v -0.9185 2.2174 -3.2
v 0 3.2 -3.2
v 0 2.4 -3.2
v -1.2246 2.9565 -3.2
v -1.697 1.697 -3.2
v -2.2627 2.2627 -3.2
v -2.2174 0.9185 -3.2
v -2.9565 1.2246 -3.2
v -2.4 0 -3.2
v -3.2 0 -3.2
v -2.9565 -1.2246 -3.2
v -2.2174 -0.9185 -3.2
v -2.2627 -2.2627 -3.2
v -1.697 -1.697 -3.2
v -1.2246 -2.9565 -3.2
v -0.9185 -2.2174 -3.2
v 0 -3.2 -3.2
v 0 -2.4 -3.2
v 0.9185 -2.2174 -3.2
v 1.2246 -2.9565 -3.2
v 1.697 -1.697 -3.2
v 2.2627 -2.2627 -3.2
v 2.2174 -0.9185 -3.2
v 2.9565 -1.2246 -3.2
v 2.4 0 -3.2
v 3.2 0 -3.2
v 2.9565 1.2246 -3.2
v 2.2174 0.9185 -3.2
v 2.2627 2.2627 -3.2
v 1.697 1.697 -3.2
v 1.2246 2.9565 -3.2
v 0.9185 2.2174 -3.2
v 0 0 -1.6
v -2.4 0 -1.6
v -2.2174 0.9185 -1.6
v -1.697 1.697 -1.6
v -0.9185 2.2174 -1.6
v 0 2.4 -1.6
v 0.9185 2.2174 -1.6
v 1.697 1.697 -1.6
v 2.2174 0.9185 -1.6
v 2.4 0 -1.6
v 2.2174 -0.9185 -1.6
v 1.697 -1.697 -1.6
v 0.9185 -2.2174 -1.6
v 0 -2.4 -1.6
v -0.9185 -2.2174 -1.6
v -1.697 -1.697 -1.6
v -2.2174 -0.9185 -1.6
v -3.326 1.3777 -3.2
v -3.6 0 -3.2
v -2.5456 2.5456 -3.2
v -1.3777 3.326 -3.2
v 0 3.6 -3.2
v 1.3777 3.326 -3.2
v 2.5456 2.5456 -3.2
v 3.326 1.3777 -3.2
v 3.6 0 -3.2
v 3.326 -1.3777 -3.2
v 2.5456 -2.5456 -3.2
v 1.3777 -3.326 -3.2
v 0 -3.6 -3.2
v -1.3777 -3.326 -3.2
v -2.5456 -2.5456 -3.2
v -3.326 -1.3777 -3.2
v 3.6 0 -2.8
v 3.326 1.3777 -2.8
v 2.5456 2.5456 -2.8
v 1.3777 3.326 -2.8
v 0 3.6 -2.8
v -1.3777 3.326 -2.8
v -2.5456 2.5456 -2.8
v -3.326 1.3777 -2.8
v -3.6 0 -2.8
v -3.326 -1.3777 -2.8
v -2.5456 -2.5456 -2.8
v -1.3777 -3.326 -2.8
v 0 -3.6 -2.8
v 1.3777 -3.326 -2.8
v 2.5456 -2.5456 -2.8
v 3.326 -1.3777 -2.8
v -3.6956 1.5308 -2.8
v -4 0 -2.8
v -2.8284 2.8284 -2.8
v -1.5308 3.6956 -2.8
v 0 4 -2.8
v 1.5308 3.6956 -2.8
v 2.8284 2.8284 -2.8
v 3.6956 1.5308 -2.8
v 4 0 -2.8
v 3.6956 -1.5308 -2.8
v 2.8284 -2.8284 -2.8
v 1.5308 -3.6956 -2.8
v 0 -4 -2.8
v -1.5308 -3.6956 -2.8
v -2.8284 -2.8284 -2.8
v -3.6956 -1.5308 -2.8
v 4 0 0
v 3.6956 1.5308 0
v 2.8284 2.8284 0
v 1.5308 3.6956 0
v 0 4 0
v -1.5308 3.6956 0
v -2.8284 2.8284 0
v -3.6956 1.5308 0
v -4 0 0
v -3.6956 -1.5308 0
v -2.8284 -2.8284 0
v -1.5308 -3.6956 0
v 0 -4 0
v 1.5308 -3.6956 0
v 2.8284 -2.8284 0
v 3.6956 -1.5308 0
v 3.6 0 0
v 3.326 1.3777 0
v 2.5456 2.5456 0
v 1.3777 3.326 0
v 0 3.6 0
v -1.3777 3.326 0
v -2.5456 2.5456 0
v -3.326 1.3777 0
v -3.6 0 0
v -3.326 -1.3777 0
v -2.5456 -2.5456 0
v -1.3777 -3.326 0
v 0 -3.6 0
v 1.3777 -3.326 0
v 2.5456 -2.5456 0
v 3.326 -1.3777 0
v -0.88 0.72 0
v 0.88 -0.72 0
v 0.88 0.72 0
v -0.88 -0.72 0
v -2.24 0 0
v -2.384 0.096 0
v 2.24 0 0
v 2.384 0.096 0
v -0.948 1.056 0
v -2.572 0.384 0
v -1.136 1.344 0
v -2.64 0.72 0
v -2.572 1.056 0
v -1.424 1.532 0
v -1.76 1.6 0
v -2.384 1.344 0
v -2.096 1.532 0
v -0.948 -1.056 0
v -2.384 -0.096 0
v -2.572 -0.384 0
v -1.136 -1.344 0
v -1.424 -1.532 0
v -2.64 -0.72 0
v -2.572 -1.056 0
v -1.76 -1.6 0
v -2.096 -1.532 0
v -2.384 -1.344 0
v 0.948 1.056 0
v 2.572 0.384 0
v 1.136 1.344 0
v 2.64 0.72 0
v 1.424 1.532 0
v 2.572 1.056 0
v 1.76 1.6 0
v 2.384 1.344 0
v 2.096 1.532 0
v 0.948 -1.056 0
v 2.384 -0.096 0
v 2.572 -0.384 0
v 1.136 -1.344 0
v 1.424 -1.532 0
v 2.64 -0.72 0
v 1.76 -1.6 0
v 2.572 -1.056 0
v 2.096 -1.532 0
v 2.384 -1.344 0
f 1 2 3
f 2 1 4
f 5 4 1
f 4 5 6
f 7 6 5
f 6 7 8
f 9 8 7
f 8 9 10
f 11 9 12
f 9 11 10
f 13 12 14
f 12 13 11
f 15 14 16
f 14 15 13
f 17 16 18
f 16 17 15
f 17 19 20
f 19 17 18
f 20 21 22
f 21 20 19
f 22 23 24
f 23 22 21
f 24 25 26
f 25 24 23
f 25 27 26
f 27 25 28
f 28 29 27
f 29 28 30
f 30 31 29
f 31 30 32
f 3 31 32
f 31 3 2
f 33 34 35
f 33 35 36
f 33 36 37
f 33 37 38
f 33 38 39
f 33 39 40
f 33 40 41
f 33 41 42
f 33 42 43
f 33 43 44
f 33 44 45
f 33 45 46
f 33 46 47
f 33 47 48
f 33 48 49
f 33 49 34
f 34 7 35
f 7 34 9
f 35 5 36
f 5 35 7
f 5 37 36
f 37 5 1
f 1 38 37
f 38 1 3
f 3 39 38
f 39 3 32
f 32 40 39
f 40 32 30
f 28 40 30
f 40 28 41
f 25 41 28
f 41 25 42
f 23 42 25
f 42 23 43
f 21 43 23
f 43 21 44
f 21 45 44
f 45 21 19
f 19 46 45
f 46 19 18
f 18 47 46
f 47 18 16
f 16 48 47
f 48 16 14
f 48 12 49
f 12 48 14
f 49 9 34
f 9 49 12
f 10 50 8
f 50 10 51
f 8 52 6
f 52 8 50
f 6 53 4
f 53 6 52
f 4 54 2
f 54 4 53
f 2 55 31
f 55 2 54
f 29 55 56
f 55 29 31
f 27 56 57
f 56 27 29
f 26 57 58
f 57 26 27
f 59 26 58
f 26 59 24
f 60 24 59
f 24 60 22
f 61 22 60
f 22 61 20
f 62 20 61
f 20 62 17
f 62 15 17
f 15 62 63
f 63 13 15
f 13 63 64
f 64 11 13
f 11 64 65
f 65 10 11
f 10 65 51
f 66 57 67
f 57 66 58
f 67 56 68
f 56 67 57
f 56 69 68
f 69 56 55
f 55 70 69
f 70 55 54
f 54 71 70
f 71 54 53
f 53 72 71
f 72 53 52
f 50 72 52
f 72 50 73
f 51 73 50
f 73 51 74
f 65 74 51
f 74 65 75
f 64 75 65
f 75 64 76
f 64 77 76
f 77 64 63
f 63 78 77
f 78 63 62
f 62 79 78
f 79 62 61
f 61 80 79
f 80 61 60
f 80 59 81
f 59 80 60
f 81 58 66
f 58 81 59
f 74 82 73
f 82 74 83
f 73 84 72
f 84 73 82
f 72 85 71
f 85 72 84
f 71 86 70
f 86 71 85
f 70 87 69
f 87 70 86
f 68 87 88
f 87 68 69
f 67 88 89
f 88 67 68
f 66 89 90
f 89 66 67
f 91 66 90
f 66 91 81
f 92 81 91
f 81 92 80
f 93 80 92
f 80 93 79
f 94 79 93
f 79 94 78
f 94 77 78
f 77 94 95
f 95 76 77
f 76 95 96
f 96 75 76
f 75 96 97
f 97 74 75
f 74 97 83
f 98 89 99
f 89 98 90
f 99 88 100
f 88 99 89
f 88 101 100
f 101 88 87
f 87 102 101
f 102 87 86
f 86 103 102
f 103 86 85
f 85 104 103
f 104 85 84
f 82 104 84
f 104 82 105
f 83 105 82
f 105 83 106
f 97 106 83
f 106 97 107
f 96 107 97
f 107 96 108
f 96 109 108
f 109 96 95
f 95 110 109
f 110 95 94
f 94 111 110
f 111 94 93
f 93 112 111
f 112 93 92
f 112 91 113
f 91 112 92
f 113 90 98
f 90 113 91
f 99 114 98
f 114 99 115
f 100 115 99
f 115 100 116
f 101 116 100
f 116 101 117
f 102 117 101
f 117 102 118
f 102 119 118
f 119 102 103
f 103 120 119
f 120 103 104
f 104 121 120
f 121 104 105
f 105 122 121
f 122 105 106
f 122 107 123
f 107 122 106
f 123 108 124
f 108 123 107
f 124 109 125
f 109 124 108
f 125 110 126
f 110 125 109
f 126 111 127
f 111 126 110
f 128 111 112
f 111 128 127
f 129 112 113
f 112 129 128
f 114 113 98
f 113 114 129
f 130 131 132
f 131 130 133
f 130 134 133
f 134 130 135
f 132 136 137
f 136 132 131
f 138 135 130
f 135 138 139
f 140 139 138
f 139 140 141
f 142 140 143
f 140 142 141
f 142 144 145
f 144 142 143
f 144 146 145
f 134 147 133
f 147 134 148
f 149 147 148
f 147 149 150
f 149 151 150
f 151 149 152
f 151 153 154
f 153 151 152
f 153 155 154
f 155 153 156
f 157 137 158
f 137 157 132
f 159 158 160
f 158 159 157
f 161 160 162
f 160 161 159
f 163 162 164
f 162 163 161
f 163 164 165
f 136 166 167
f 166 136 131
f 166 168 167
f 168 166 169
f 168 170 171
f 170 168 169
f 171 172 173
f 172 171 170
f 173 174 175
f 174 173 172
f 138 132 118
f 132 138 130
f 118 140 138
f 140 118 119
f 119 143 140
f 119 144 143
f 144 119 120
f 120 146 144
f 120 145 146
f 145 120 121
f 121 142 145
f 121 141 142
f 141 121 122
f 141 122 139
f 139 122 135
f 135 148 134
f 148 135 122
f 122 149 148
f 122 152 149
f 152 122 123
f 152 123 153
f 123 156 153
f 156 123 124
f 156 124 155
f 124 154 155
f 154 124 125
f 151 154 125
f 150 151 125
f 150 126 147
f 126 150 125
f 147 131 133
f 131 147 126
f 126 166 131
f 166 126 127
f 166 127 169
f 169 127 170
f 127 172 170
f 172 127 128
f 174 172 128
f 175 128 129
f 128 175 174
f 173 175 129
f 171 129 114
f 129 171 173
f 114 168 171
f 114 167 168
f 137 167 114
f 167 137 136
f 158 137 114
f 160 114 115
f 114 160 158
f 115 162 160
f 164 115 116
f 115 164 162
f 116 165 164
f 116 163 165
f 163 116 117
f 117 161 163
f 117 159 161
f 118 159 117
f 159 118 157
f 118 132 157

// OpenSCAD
// file: ../p/4-4disc.scad
use <../lib.scad>
function ldraw_lib__4_4disc() = [
// 0 Disc 1.0
// 0 Name: 4-4disc.dat
// 0 Author: James Jessiman
// 0 !LDRAW_ORG Primitive UPDATE 2002-02
// 0 !LICENSE Licensed under CC BY 2.0 and CC BY 4.0 : see CAreadme.txt
// 
// 0 BFC CERTIFY CCW
  [0,"BFC","CERTIFY"],
  [0,"BFC","CCW"],
// 
// 0 !HISTORY 1998-12-15 [PTadmin] Official Update 1998-10
// 0 !HISTORY 2002-03-23 [sbliss] Added BFC statement
// 0 !HISTORY 2002-04-25 [PTadmin] Official Update 2002-02
// 0 !HISTORY 2007-06-24 [PTadmin] Header formatted for Contributor Agreement
// 0 !HISTORY 2008-07-01 [PTadmin] Official Update 2008-01
// 
// 
// 3 16 0 0 0 1 0 0 0.9239 0 0.3827
  [3,16,0,0,0,1,0,0,0.9239,0,0.3827],
// 3 16 0 0 0 0.9239 0 0.3827 0.7071 0 0.7071
  [3,16,0,0,0,0.9239,0,0.3827,0.7071,0,0.7071],
// 3 16 0 0 0 0.7071 0 0.7071 0.3827 0 0.9239
  [3,16,0,0,0,0.7071,0,0.7071,0.3827,0,0.9239],
// 3 16 0 0 0 0.3827 0 0.9239 0 0 1
  [3,16,0,0,0,0.3827,0,0.9239,0,0,1],
// 3 16 0 0 0 0 0 1 -0.3827 0 0.9239
  [3,16,0,0,0,0,0,1,-0.3827,0,0.9239],
// 3 16 0 0 0 -0.3827 0 0.9239 -0.7071 0 0.7071
  [3,16,0,0,0,-0.3827,0,0.9239,-0.7071,0,0.7071],
// 3 16 0 0 0 -0.7071 0 0.7071 -0.9239 0 0.3827
  [3,16,0,0,0,-0.7071,0,0.7071,-0.9239,0,0.3827],
// 3 16 0 0 0 -0.9239 0 0.3827 -1 0 -0
  [3,16,0,0,0,-0.9239,0,0.3827,-1,0,-0],
// 3 16 0 0 0 -1 0 -0 -0.9239 0 -0.3827
  [3,16,0,0,0,-1,0,-0,-0.9239,0,-0.3827],
// 3 16 0 0 0 -0.9239 0 -0.3827 -0.7071 0 -0.7071
  [3,16,0,0,0,-0.9239,0,-0.3827,-0.7071,0,-0.7071],
// 3 16 0 0 0 -0.7071 0 -0.7071 -0.3827 0 -0.9239
  [3,16,0,0,0,-0.7071,0,-0.7071,-0.3827,0,-0.9239],
// 3 16 0 0 0 -0.3827 0 -0.9239 0 0 -1
  [3,16,0,0,0,-0.3827,0,-0.9239,0,0,-1],
// 3 16 0 0 0 0 0 -1 0.3827 0 -0.9239
  [3,16,0,0,0,0,0,-1,0.3827,0,-0.9239],
// 3 16 0 0 0 0.3827 0 -0.9239 0.7071 0 -0.7071
  [3,16,0,0,0,0.3827,0,-0.9239,0.7071,0,-0.7071],
// 3 16 0 0 0 0.7071 0 -0.7071 0.9239 0 -0.3827
  [3,16,0,0,0,0.7071,0,-0.7071,0.9239,0,-0.3827],
// 3 16 0 0 0 0.9239 0 -0.3827 1 0 0
  [3,16,0,0,0,0.9239,0,-0.3827,1,0,0],
// 0
];
module ldraw_lib__4_4disc(step=0, col=false, unit=2/5, alt=false, line=0.2, solid=!$preview)
    makepoly(ldraw_lib__4_4disc(), step=step, col=col, unit=unit, alt=alt, line=line, solid=solid);
ldraw_lib__4_4disc(line=0.2);
// file: ../p/4-4ring3.scad
use <../lib.scad>
$fa=1; $fs=0.2;
function ldraw_lib__4_4ring3(realsolid=false) = [
// 0 Ring  3 x 1.0
// 0 Name: 4-4ring3.dat
// 0 Author: James Jessiman
// 0 !LDRAW_ORG Primitive UPDATE 2009-01
// 0 !LICENSE Licensed under CC BY 2.0 and CC BY 4.0 : see CAreadme.txt
// 
// 0 BFC CERTIFY CCW
  [0,"BFC","CERTIFY"],
  [0,"BFC","CCW"],
// 
// 0 !HISTORY 1998-12-15 [PTadmin] Official Update 1998-10
// 0 !HISTORY 2002-04-05 [hafhead] Added BFC statement
// 0 !HISTORY 2002-04-25 [PTadmin] Official Update 2002-02
// 0 !HISTORY 2007-06-24 [PTadmin] Header formatted for Contributor Agreement
// 0 !HISTORY 2008-07-01 [PTadmin] Official Update 2008-01
// 0 !HISTORY 2008-08-26 [cwdee] Switch polygon winding and rename
// 0 !HISTORY 2009-05-02 [PTadmin] Official Update 2009-01
// 
// 
// 4 16 -1.5308 0 3.6956 -1.1481 0 2.7717 0 0 3 0 0 4
  [4,16,-1.5308,0,3.6956,-1.1481,0,2.7717,0,0,3,0,0,4],
// 4 16 -2.8284 0 2.8284 -2.1213 0 2.1213 -1.1481 0 2.7717 -1.5308 0 3.6956
  [4,16,-2.8284,0,2.8284,-2.1213,0,2.1213,-1.1481,0,2.7717,-1.5308,0,3.6956],
// 4 16 -3.6956 0 1.5308 -2.7717 0 1.1481 -2.1213 0 2.1213 -2.8284 0 2.8284
  [4,16,-3.6956,0,1.5308,-2.7717,0,1.1481,-2.1213,0,2.1213,-2.8284,0,2.8284],
// 4 16 -4 0 0 -3 0 0 -2.7717 0 1.1481 -3.6956 0 1.5308
  [4,16,-4,0,0,-3,0,0,-2.7717,0,1.1481,-3.6956,0,1.5308],
// 4 16 -3.6956 0 -1.5308 -2.7717 0 -1.1481 -3 0 0 -4 0 0
  [4,16,-3.6956,0,-1.5308,-2.7717,0,-1.1481,-3,0,0,-4,0,0],
// 4 16 -2.8284 0 -2.8284 -2.1213 0 -2.1213 -2.7717 0 -1.1481 -3.6956 0 -1.5308
  [4,16,-2.8284,0,-2.8284,-2.1213,0,-2.1213,-2.7717,0,-1.1481,-3.6956,0,-1.5308],
// 4 16 -1.5308 0 -3.6956 -1.1481 0 -2.7717 -2.1213 0 -2.1213 -2.8284 0 -2.8284
  [4,16,-1.5308,0,-3.6956,-1.1481,0,-2.7717,-2.1213,0,-2.1213,-2.8284,0,-2.8284],
// 4 16 0 0 -4 0 0 -3 -1.1481 0 -2.7717 -1.5308 0 -3.6956
  [4,16,0,0,-4,0,0,-3,-1.1481,0,-2.7717,-1.5308,0,-3.6956],
// 4 16 1.5308 0 -3.6956 1.1481 0 -2.7717 0 0 -3 0 0 -4
  [4,16,1.5308,0,-3.6956,1.1481,0,-2.7717,0,0,-3,0,0,-4],
// 4 16 2.8284 0 -2.8284 2.1213 0 -2.1213 1.1481 0 -2.7717 1.5308 0 -3.6956
  [4,16,2.8284,0,-2.8284,2.1213,0,-2.1213,1.1481,0,-2.7717,1.5308,0,-3.6956],
// 4 16 3.6956 0 -1.5308 2.7717 0 -1.1481 2.1213 0 -2.1213 2.8284 0 -2.8284
  [4,16,3.6956,0,-1.5308,2.7717,0,-1.1481,2.1213,0,-2.1213,2.8284,0,-2.8284],
// 4 16 4 0 0 3 0 0 2.7717 0 -1.1481 3.6956 0 -1.5308
  [4,16,4,0,0,3,0,0,2.7717,0,-1.1481,3.6956,0,-1.5308],
// 4 16 3.6956 0 1.5308 2.7717 0 1.1481 3 0 0 4 0 0
  [4,16,3.6956,0,1.5308,2.7717,0,1.1481,3,0,0,4,0,0],
// 4 16 2.8284 0 2.8284 2.1213 0 2.1213 2.7717 0 1.1481 3.6956 0 1.5308
  [4,16,2.8284,0,2.8284,2.1213,0,2.1213,2.7717,0,1.1481,3.6956,0,1.5308],
// 4 16 1.5308 0 3.6956 1.1481 0 2.7717 2.1213 0 2.1213 2.8284 0 2.8284
  [4,16,1.5308,0,3.6956,1.1481,0,2.7717,2.1213,0,2.1213,2.8284,0,2.8284],
// 4 16 0 0 4 0 0 3 1.1481 0 2.7717 1.5308 0 3.6956
  [4,16,0,0,4,0,0,3,1.1481,0,2.7717,1.5308,0,3.6956],
// 0
];
module ldraw_lib__4_4ring3(step=0, col=false, unit=2/5, alt=false, line=0.2, solid=!$preview)
    makepoly(ldraw_lib__4_4ring3(solid), step=step, col=col, unit=unit, alt=alt, line=line, solid=solid);
ldraw_lib__4_4ring3(line=0.2);
// file: ../p/4-4cylc.scad
use <../lib.scad>
use <4-4cyli.scad>
use <4-4disc.scad>
use <4-4edge.scad>
function ldraw_lib__4_4cylc() = [
// 0 Cylinder Closed 1.0
// 0 Name: 4-4cylc.dat
// 0 Author: Alex Taylor [anathema]
// 0 !LDRAW_ORG Primitive UPDATE 2009-02
// 0 !LICENSE Licensed under CC BY 4.0 : see CAreadme.txt
// 
// 0 BFC CERTIFY CCW
  [0,"BFC","CERTIFY"],
  [0,"BFC","CCW"],
// 
// 0 !HISTORY 2008-12-29 [cwdee] Removed one disc
// 0 !HISTORY 2009-09-03 [PTadmin] Official Update 2009-02
// 
// 
// 1 16 0 0 0 1 0 0 0 1 0 0 0 1 4-4edge.dat
  [1,16,0,0,0,1,0,0,0,1,0,0,0,1, ldraw_lib__4_4edge()],
// 1 16 0 1 0 1 0 0 0 1 0 0 0 1 4-4edge.dat
  [1,16,0,1,0,1,0,0,0,1,0,0,0,1, ldraw_lib__4_4edge()],
// 1 16 0 0 0 1 0 0 0 1 0 0 0 1 4-4disc.dat
  [1,16,0,0,0,1,0,0,0,1,0,0,0,1, ldraw_lib__4_4disc()],
// 1 16 0 0 0 1 0 0 0 1 0 0 0 1 4-4cyli.dat
  [1,16,0,0,0,1,0,0,0,1,0,0,0,1, ldraw_lib__4_4cyli()],
// 0
];
module ldraw_lib__4_4cylc(step=0, col=false, unit=2/5, alt=false, line=0.2, solid=!$preview)
    makepoly(ldraw_lib__4_4cylc(), step=step, col=col, unit=unit, alt=alt, line=line, solid=solid);
ldraw_lib__4_4cylc(line=0.2);
// file: ../p/4-4edge.scad
use <../lib.scad>
function ldraw_lib__4_4edge() = [
// 0 Circle 1.0
// 0 Name: 4-4edge.dat
// 0 Author: James Jessiman
// 0 !LDRAW_ORG Primitive UPDATE 2017-01
// 0 !LICENSE Licensed under CC BY 2.0 and CC BY 4.0 : see CAreadme.txt
// 
// 0 BFC CERTIFY CCW
  [0,"BFC","CERTIFY"],
  [0,"BFC","CCW"],
// 
// 0 !HISTORY 1998-12-15 [PTadmin] Official Update 1998-10
// 0 !HISTORY 2005-12-28 [PTadmin] Official Update 2005-01
// 0 !HISTORY 2007-06-24 [PTadmin] Header formatted for Contributor Agreement
// 0 !HISTORY 2008-07-01 [PTadmin] Official Update 2008-01
// 0 !HISTORY 2017-01-15 [Steffen] BFCed
// 0 !HISTORY 2017-12-30 [PTadmin] Official Update 2017-01
// 
// 
// 2 24 1 0 0 0.9239 0 0.3827
  [2,24,1,0,0,0.9239,0,0.3827],
// 2 24 0.9239 0 0.3827 0.7071 0 0.7071
  [2,24,0.9239,0,0.3827,0.7071,0,0.7071],
// 2 24 0.7071 0 0.7071 0.3827 0 0.9239
  [2,24,0.7071,0,0.7071,0.3827,0,0.9239],
// 2 24 0.3827 0 0.9239 0 0 1
  [2,24,0.3827,0,0.9239,0,0,1],
// 2 24 0 0 1 -0.3827 0 0.9239
  [2,24,0,0,1,-0.3827,0,0.9239],
// 2 24 -0.3827 0 0.9239 -0.7071 0 0.7071
  [2,24,-0.3827,0,0.9239,-0.7071,0,0.7071],
// 2 24 -0.7071 0 0.7071 -0.9239 0 0.3827
  [2,24,-0.7071,0,0.7071,-0.9239,0,0.3827],
// 2 24 -0.9239 0 0.3827 -1 0 -0
  [2,24,-0.9239,0,0.3827,-1,0,-0],
// 2 24 -1 0 -0 -0.9239 0 -0.3827
  [2,24,-1,0,-0,-0.9239,0,-0.3827],
// 2 24 -0.9239 0 -0.3827 -0.7071 0 -0.7071
  [2,24,-0.9239,0,-0.3827,-0.7071,0,-0.7071],
// 2 24 -0.7071 0 -0.7071 -0.3827 0 -0.9239
  [2,24,-0.7071,0,-0.7071,-0.3827,0,-0.9239],
// 2 24 -0.3827 0 -0.9239 0 0 -1
  [2,24,-0.3827,0,-0.9239,0,0,-1],
// 2 24 0 0 -1 0.3827 0 -0.9239
  [2,24,0,0,-1,0.3827,0,-0.9239],
// 2 24 0.3827 0 -0.9239 0.7071 0 -0.7071
  [2,24,0.3827,0,-0.9239,0.7071,0,-0.7071],
// 2 24 0.7071 0 -0.7071 0.9239 0 -0.3827
  [2,24,0.7071,0,-0.7071,0.9239,0,-0.3827],
// 2 24 0.9239 0 -0.3827 1 0 0
  [2,24,0.9239,0,-0.3827,1,0,0],
];
module ldraw_lib__4_4edge(step=0, col=false, unit=2/5, alt=false, line=0.2, solid=!$preview)
    makepoly(ldraw_lib__4_4edge(), step=step, col=col, unit=unit, alt=alt, line=line, solid=solid);
ldraw_lib__4_4edge(line=0.2);
// file: ../p/4-4cyli.scad
use <../lib.scad>
$fa=1; $fs=0.2;
function ldraw_lib__4_4cyli(realsolid=false) = [
// 0 Cylinder 1.0
// 0 Name: 4-4cyli.dat
// 0 Author: James Jessiman
// 0 !LDRAW_ORG Primitive UPDATE 2005-01
// 0 !LICENSE Licensed under CC BY 2.0 and CC BY 4.0 : see CAreadme.txt
// 
// 0 BFC CERTIFY CCW
  [0,"BFC","CERTIFY"],
  [0,"BFC","CCW"],
// 
// 0 !HISTORY 1998-12-15 [PTadmin] Official Update 1998-10
// 0 !HISTORY 2002-03-23 [sbliss] Added BFC statement; merged headers from files in distributions LDraw 0.27 and Complete.
// 0 !HISTORY 2002-04-25 [PTadmin] Official Update 2002-02
// 0 !HISTORY 2004-12-14 [guyvivan] BFC CCW
// 0 !HISTORY 2005-12-28 [PTadmin] Official Update 2005-01
// 0 !HISTORY 2007-06-24 [PTadmin] Header formatted for Contributor Agreement
// 0 !HISTORY 2008-07-01 [PTadmin] Official Update 2008-01
// 
// 
// 4 16 1 1 0 0.9239 1 0.3827 0.9239 0 0.3827 1 0 0
  [4,16,1,1,0,0.9239,1,0.3827,0.9239,0,0.3827,1,0,0],
// 5 24 1 0 0 1 1 0 0.9239 0 0.3827 0.9239 0 -0.3827
  [5,24,1,0,0,1,1,0,0.9239,0,0.3827,0.9239,0,-0.3827],
// 4 16 0.9239 1 0.3827 0.7071 1 0.7071 0.7071 0 0.7071 0.9239 0 0.3827
  [4,16,0.9239,1,0.3827,0.7071,1,0.7071,0.7071,0,0.7071,0.9239,0,0.3827],
// 5 24 0.9239 0 0.3827 0.9239 1 0.3827 0.7071 0 0.7071 1 0 0
  [5,24,0.9239,0,0.3827,0.9239,1,0.3827,0.7071,0,0.7071,1,0,0],
// 4 16 0.7071 1 0.7071 0.3827 1 0.9239 0.3827 0 0.9239 0.7071 0 0.7071
  [4,16,0.7071,1,0.7071,0.3827,1,0.9239,0.3827,0,0.9239,0.7071,0,0.7071],
// 5 24 0.7071 0 0.7071 0.7071 1 0.7071 0.3827 0 0.9239 0.9239 0 0.3827
  [5,24,0.7071,0,0.7071,0.7071,1,0.7071,0.3827,0,0.9239,0.9239,0,0.3827],
// 4 16 0.3827 1 0.9239 0 1 1 0 0 1 0.3827 0 0.9239
  [4,16,0.3827,1,0.9239,0,1,1,0,0,1,0.3827,0,0.9239],
// 5 24 0.3827 0 0.9239 0.3827 1 0.9239 0 0 1 0.7071 0 0.7071
  [5,24,0.3827,0,0.9239,0.3827,1,0.9239,0,0,1,0.7071,0,0.7071],
// 4 16 0 1 1 -0.3827 1 0.9239 -0.3827 0 0.9239 0 0 1
  [4,16,0,1,1,-0.3827,1,0.9239,-0.3827,0,0.9239,0,0,1],
// 5 24 0 0 1 0 1 1 -0.3827 0 0.9239 0.3827 0 0.9239
  [5,24,0,0,1,0,1,1,-0.3827,0,0.9239,0.3827,0,0.9239],
// 4 16 -0.3827 1 0.9239 -0.7071 1 0.7071 -0.7071 0 0.7071 -0.3827 0 0.9239
  [4,16,-0.3827,1,0.9239,-0.7071,1,0.7071,-0.7071,0,0.7071,-0.3827,0,0.9239],
// 5 24 -0.3827 0 0.9239 -0.3827 1 0.9239 -0.7071 0 0.7071 0 0 1
  [5,24,-0.3827,0,0.9239,-0.3827,1,0.9239,-0.7071,0,0.7071,0,0,1],
// 4 16 -0.7071 1 0.7071 -0.9239 1 0.3827 -0.9239 0 0.3827 -0.7071 0 0.7071
  [4,16,-0.7071,1,0.7071,-0.9239,1,0.3827,-0.9239,0,0.3827,-0.7071,0,0.7071],
// 5 24 -0.7071 0 0.7071 -0.7071 1 0.7071 -0.9239 0 0.3827 -0.3827 0 0.9239
  [5,24,-0.7071,0,0.7071,-0.7071,1,0.7071,-0.9239,0,0.3827,-0.3827,0,0.9239],
// 4 16 -0.9239 1 0.3827 -1 1 0 -1 0 0 -0.9239 0 0.3827
  [4,16,-0.9239,1,0.3827,-1,1,0,-1,0,0,-0.9239,0,0.3827],
// 5 24 -0.9239 0 0.3827 -0.9239 1 0.3827 -1 0 0 -0.7071 0 0.7071
  [5,24,-0.9239,0,0.3827,-0.9239,1,0.3827,-1,0,0,-0.7071,0,0.7071],
// 4 16 -1 1 0 -0.9239 1 -0.3827 -0.9239 0 -0.3827 -1 0 0
  [4,16,-1,1,0,-0.9239,1,-0.3827,-0.9239,0,-0.3827,-1,0,0],
// 5 24 -1 0 0 -1 1 0 -0.9239 0 -0.3827 -0.9239 0 0.3827
  [5,24,-1,0,0,-1,1,0,-0.9239,0,-0.3827,-0.9239,0,0.3827],
// 4 16 -0.9239 1 -0.3827 -0.7071 1 -0.7071 -0.7071 0 -0.7071 -0.9239 0 -0.3827
  [4,16,-0.9239,1,-0.3827,-0.7071,1,-0.7071,-0.7071,0,-0.7071,-0.9239,0,-0.3827],
// 5 24 -0.9239 0 -0.3827 -0.9239 1 -0.3827 -0.7071 0 -0.7071 -1 0 0
  [5,24,-0.9239,0,-0.3827,-0.9239,1,-0.3827,-0.7071,0,-0.7071,-1,0,0],
// 4 16 -0.7071 1 -0.7071 -0.3827 1 -0.9239 -0.3827 0 -0.9239 -0.7071 0 -0.7071
  [4,16,-0.7071,1,-0.7071,-0.3827,1,-0.9239,-0.3827,0,-0.9239,-0.7071,0,-0.7071],
// 5 24 -0.7071 0 -0.7071 -0.7071 1 -0.7071 -0.3827 0 -0.9239 -0.9239 0 -0.3827
  [5,24,-0.7071,0,-0.7071,-0.7071,1,-0.7071,-0.3827,0,-0.9239,-0.9239,0,-0.3827],
// 4 16 -0.3827 1 -0.9239 0 1 -1 0 0 -1 -0.3827 0 -0.9239
  [4,16,-0.3827,1,-0.9239,0,1,-1,0,0,-1,-0.3827,0,-0.9239],
// 5 24 -0.3827 0 -0.9239 -0.3827 1 -0.9239 0 0 -1 -0.7071 0 -0.7071
  [5,24,-0.3827,0,-0.9239,-0.3827,1,-0.9239,0,0,-1,-0.7071,0,-0.7071],
// 4 16 0 1 -1 0.3827 1 -0.9239 0.3827 0 -0.9239 0 0 -1
  [4,16,0,1,-1,0.3827,1,-0.9239,0.3827,0,-0.9239,0,0,-1],
// 5 24 0 0 -1 0 1 -1 0.3827 0 -0.9239 -0.3827 0 -0.9239
  [5,24,0,0,-1,0,1,-1,0.3827,0,-0.9239,-0.3827,0,-0.9239],
// 4 16 0.3827 1 -0.9239 0.7071 1 -0.7071 0.7071 0 -0.7071 0.3827 0 -0.9239
  [4,16,0.3827,1,-0.9239,0.7071,1,-0.7071,0.7071,0,-0.7071,0.3827,0,-0.9239],
// 5 24 0.3827 0 -0.9239 0.3827 1 -0.9239 0.7071 0 -0.7071 0 0 -1
  [5,24,0.3827,0,-0.9239,0.3827,1,-0.9239,0.7071,0,-0.7071,0,0,-1],
// 4 16 0.7071 1 -0.7071 0.9239 1 -0.3827 0.9239 0 -0.3827 0.7071 0 -0.7071
  [4,16,0.7071,1,-0.7071,0.9239,1,-0.3827,0.9239,0,-0.3827,0.7071,0,-0.7071],
// 5 24 0.7071 0 -0.7071 0.7071 1 -0.7071 0.9239 0 -0.3827 0.3827 0 -0.9239
  [5,24,0.7071,0,-0.7071,0.7071,1,-0.7071,0.9239,0,-0.3827,0.3827,0,-0.9239],
// 4 16 0.9239 1 -0.3827 1 1 0 1 0 0 0.9239 0 -0.3827
  [4,16,0.9239,1,-0.3827,1,1,0,1,0,0,0.9239,0,-0.3827],
// 5 24 0.9239 0 -0.3827 0.9239 1 -0.3827 1 0 0 0.7071 0 -0.7071
  [5,24,0.9239,0,-0.3827,0.9239,1,-0.3827,1,0,0,0.7071,0,-0.7071],
// 0
];
module ldraw_lib__4_4cyli(step=0, col=false, unit=2/5, alt=false, line=0.2, solid=!$preview)
    makepoly(ldraw_lib__4_4cyli(solid), step=step, col=col, unit=unit, alt=alt, line=line, solid=solid);
ldraw_lib__4_4cyli(line=0.2);
// file: ../p/stud4o.scad
use <../lib.scad>
use <4-4cylc.scad>
use <4-4ring3.scad>
function ldraw_lib__stud4o() = [
// 0 Stud Tube Open without Outer Cylinder
// 0 Name: stud4o.dat
// 0 Author: Magnus Forsberg [MagFors]
// 0 !LDRAW_ORG Primitive UPDATE 2011-02
// 0 !LICENSE Licensed under CC BY 4.0 : see CAreadme.txt
// 
// 0 !HELP This stud is a "antistud" to be used like a underside stud,
// 0 !HELP but without the outer cylinder.
// 0 !HELP 1 47 0 0 0 1 0 0 0 1 0 0 0 1 stud4.dat
// 
// 0 BFC CERTIFY CCW
  [0,"BFC","CERTIFY"],
  [0,"BFC","CCW"],
// 
// 0 !HISTORY 2011-12-29 [PTadmin] Official Update 2011-02
// 
// 
// 1 16 0 -4 0 2 0 0 0 1 0 0 0 2 4-4ring3.dat
  [1,16,0,-4,0,2,0,0,0,1,0,0,0,2, ldraw_lib__4_4ring3()],
// 0 BFC INVERTNEXT
  [0,"BFC","INVERTNEXT"],
// 1 16 0 0 0 -6 0 0 0 -4 0 0 0 6 4-4cylc.dat
  [1,16,0,0,0,-6,0,0,0,-4,0,0,0,6, ldraw_lib__4_4cylc()],
];
module ldraw_lib__stud4o(step=0, col=false, unit=2/5, alt=false, line=0.2, solid=!$preview)
    makepoly(ldraw_lib__stud4o(), step=step, col=col, unit=unit, alt=alt, line=line, solid=solid);
ldraw_lib__stud4o(line=0.2);
// file: ../p/4-4ring8.scad
use <../lib.scad>
function ldraw_lib__4_4ring8() = [
// 0 Ring  8 x 1.0
// 0 Name: 4-4ring8.dat
// 0 Author: Steffen [Steffen]
// 0 !LDRAW_ORG Primitive UPDATE 2012-01
// 0 !LICENSE Licensed under CC BY 4.0 : see CAreadme.txt
// 
// 0 BFC CERTIFY CCW
  [0,"BFC","CERTIFY"],
  [0,"BFC","CCW"],
// 
// 0 !HISTORY 2003-12-19 [PTadmin] Official Update 2003-03
// 0 !HISTORY 2007-06-24 [PTadmin] Header formatted for Contributor Agreement
// 0 !HISTORY 2008-07-01 [PTadmin] Official Update 2008-01
// 0 !HISTORY 2012-02-16 [Philo] Changed to CCW
// 0 !HISTORY 2012-03-30 [PTadmin] Official Update 2012-01
// 
// 
// 4 16 9 0 0 8.3151 0 3.4443 7.3912 0 3.0616 8 0 0
  [4,16,9,0,0,8.3151,0,3.4443,7.3912,0,3.0616,8,0,0],
// 4 16 8.3151 0 3.4443 6.3639 0 6.3639 5.6568 0 5.6568 7.3912 0 3.0616
  [4,16,8.3151,0,3.4443,6.3639,0,6.3639,5.6568,0,5.6568,7.3912,0,3.0616],
// 4 16 6.3639 0 6.3639 3.4443 0 8.3151 3.0616 0 7.3912 5.6568 0 5.6568
  [4,16,6.3639,0,6.3639,3.4443,0,8.3151,3.0616,0,7.3912,5.6568,0,5.6568],
// 4 16 3.4443 0 8.3151 0 0 9 0 0 8 3.0616 0 7.3912
  [4,16,3.4443,0,8.3151,0,0,9,0,0,8,3.0616,0,7.3912],
// 4 16 0 0 9 -3.4443 0 8.3151 -3.0616 0 7.3912 0 0 8
  [4,16,0,0,9,-3.4443,0,8.3151,-3.0616,0,7.3912,0,0,8],
// 4 16 -3.4443 0 8.3151 -6.3639 0 6.3639 -5.6568 0 5.6568 -3.0616 0 7.3912
  [4,16,-3.4443,0,8.3151,-6.3639,0,6.3639,-5.6568,0,5.6568,-3.0616,0,7.3912],
// 4 16 -6.3639 0 6.3639 -8.3151 0 3.4443 -7.3912 0 3.0616 -5.6568 0 5.6568
  [4,16,-6.3639,0,6.3639,-8.3151,0,3.4443,-7.3912,0,3.0616,-5.6568,0,5.6568],
// 4 16 -8.3151 0 3.4443 -9 0 0 -8 0 0 -7.3912 0 3.0616
  [4,16,-8.3151,0,3.4443,-9,0,0,-8,0,0,-7.3912,0,3.0616],
// 4 16 -9 0 0 -8.3151 0 -3.4443 -7.3912 0 -3.0616 -8 0 0
  [4,16,-9,0,0,-8.3151,0,-3.4443,-7.3912,0,-3.0616,-8,0,0],
// 4 16 -8.3151 0 -3.4443 -6.3639 0 -6.3639 -5.6568 0 -5.6568 -7.3912 0 -3.0616
  [4,16,-8.3151,0,-3.4443,-6.3639,0,-6.3639,-5.6568,0,-5.6568,-7.3912,0,-3.0616],
// 4 16 -6.3639 0 -6.3639 -3.4443 0 -8.3151 -3.0616 0 -7.3912 -5.6568 0 -5.6568
  [4,16,-6.3639,0,-6.3639,-3.4443,0,-8.3151,-3.0616,0,-7.3912,-5.6568,0,-5.6568],
// 4 16 -3.4443 0 -8.3151 0 0 -9 0 0 -8 -3.0616 0 -7.3912
  [4,16,-3.4443,0,-8.3151,0,0,-9,0,0,-8,-3.0616,0,-7.3912],
// 4 16 0 0 -9 3.4443 0 -8.3151 3.0616 0 -7.3912 0 0 -8
  [4,16,0,0,-9,3.4443,0,-8.3151,3.0616,0,-7.3912,0,0,-8],
// 4 16 3.4443 0 -8.3151 6.3639 0 -6.3639 5.6568 0 -5.6568 3.0616 0 -7.3912
  [4,16,3.4443,0,-8.3151,6.3639,0,-6.3639,5.6568,0,-5.6568,3.0616,0,-7.3912],
// 4 16 6.3639 0 -6.3639 8.3151 0 -3.4443 7.3912 0 -3.0616 5.6568 0 -5.6568
  [4,16,6.3639,0,-6.3639,8.3151,0,-3.4443,7.3912,0,-3.0616,5.6568,0,-5.6568],
// 4 16 8.3151 0 -3.4443 9 0 0 8 0 0 7.3912 0 -3.0616
  [4,16,8.3151,0,-3.4443,9,0,0,8,0,0,7.3912,0,-3.0616],
];
module ldraw_lib__4_4ring8(step=0, col=false, unit=2/5, alt=false, line=0.2, solid=!$preview)
    makepoly(ldraw_lib__4_4ring8(), step=step, col=col, unit=unit, alt=alt, line=line, solid=solid);
ldraw_lib__4_4ring8(line=0.2);
// file: ../p/4-4cylo.scad
use <../lib.scad>
use <4-4cyli.scad>
use <4-4edge.scad>
function ldraw_lib__4_4cylo() = [
// 0 Cylinder Open 1.0
// 0 Name: 4-4cylo.dat
// 0 Author: Mark Kennedy [mkennedy]
// 0 !LDRAW_ORG Primitive UPDATE 2010-01
// 0 !LICENSE Licensed under CC BY 2.0 and CC BY 4.0 : see CAreadme.txt
// 
// 0 BFC CERTIFY CCW
  [0,"BFC","CERTIFY"],
  [0,"BFC","CCW"],
// 
// 0 !HISTORY 2010-04-05 [PTadmin] Official Update 2010-01
// 
// 
// 1 16 0 0 0 1 0 0 0 1 0 0 0 1 4-4edge.dat
  [1,16,0,0,0,1,0,0,0,1,0,0,0,1, ldraw_lib__4_4edge()],
// 1 16 0 1 0 1 0 0 0 1 0 0 0 1 4-4edge.dat
  [1,16,0,1,0,1,0,0,0,1,0,0,0,1, ldraw_lib__4_4edge()],
// 1 16 0 0 0 1 0 0 0 1 0 0 0 1 4-4cyli.dat
  [1,16,0,0,0,1,0,0,0,1,0,0,0,1, ldraw_lib__4_4cyli()],
// 0
];
makepoly(ldraw_lib__4_4cylo(), line=0.2);
// file: ../p/empty.scad
use <../lib.scad>
function ldraw_lib__empty() = [
// 0 Empty
// 0 Name: empty.dat
// 0 Author: Steffen [Steffen]
// 0 !LDRAW_ORG Primitive UPDATE 2015-01
// 0 !LICENSE Licensed under CC BY 4.0 : see CAreadme.txt
// 
// 0 BFC CERTIFY CCW
  [0,"BFC","CERTIFY"],
  [0,"BFC","CCW"],
// 
// 0 !HISTORY 2015-10-11 [PTadmin] Official Update 2015-01
// 
// 
// 0 // // Tool MLCad cannot handle really empty files. This file is used as a workaround.
// 0 // // It exceptionally contains forbidden non-LDRAW standard syntax to satisfy MLCad until it is fixed OR a different editor has become the de-facto LDRAW standard.
// 0 // // The line being used here is an "impossible" conditional line which never should be visible,
// 0 // // additionally hidden by a syntax explicitly hiding it from displaying.
// 
// 0 // MLCAD HIDE 5 24 0 0 0 0.0001 0 0 0.0001 -0.0001 0 0 0 0
];
module ldraw_lib__empty(step=0, col=false, unit=2/5, alt=false, line=0.2, solid=!$preview)
    makepoly(ldraw_lib__empty(), step=step, col=col, unit=unit, alt=alt, line=line, solid=solid);
ldraw_lib__empty(line=0.2);
// file: s/98138s02.scad
use <../../lib.scad>
use <../../p/4-4cylo.scad>
use <../../p/4-4ring8.scad>
use <../../p/4-4ring9.scad>
use <../../p/stud4o.scad>
function ldraw_lib__s__98138s02() = [
// 0 ~Tile  1 x  1 Round with Groove without Complete Top Face
// 0 Name: s\98138s02.dat
// 0 Author: Magnus Forsberg [MagFors]
// 0 !LDRAW_ORG Subpart UPDATE 2020-01
// 0 !LICENSE Licensed under CC BY 2.0 and CC BY 4.0 : see CAreadme.txt
// 
// 0 BFC CERTIFY CCW
  [0,"BFC","CERTIFY"],
  [0,"BFC","CCW"],
// 
// 0 !HISTORY 2020-06-28 [PTadmin] Official Update 2020-01
// 
// 
// 1 16 0 4 0 1 0 0 0 -1 0 0 0 1 stud4o.dat
  [1,16,0,4,0,1,0,0,0,-1,0,0,0,1, ldraw_lib__stud4o()],
// 1 16 0 8 0 -1 0 0 0 -1 0 0 0 1 4-4ring8.dat
  [1,16,0,8,0,-1,0,0,0,-1,0,0,0,1, ldraw_lib__4_4ring8()],
// 1 16 0 7 0 9 0 0 0 1 0 0 0 9 4-4cylo.dat
  [1,16,0,7,0,9,0,0,0,1,0,0,0,9, ldraw_lib__4_4cylo()],
// 1 16 0 7 0 -1 0 0 0 -1 0 0 0 1 4-4ring9.dat
  [1,16,0,7,0,-1,0,0,0,-1,0,0,0,1, ldraw_lib__4_4ring9()],
// 1 16 0 0 0 10 0 0 0 7 0 0 0 10 4-4cylo.dat
  [1,16,0,0,0,10,0,0,0,7,0,0,0,10, ldraw_lib__4_4cylo()],
];
module ldraw_lib__s__98138s02(step=0, col=false, unit=2/5, alt=false, line=0.2, solid=!$preview)
    makepoly(ldraw_lib__s__98138s02(), step=step, col=col, unit=unit, alt=alt, line=line, solid=solid);
ldraw_lib__s__98138s02(line=0.2);
// file: ../p/4-4ring9.scad
use <../lib.scad>
function ldraw_lib__4_4ring9() = [
// 0 Ring  9 x 1.0
// 0 Name: 4-4ring9.dat
// 0 Author: John Riley [jriley]
// 0 !LDRAW_ORG Primitive UPDATE 2004-02
// 0 !LICENSE Licensed under CC BY 2.0 and CC BY 4.0 : see CAreadme.txt
// 
// 0 BFC CERTIFY CCW
  [0,"BFC","CERTIFY"],
  [0,"BFC","CCW"],
// 
// 0 !HISTORY 2004-04-22 [PTadmin] Official Update 2004-02
// 0 !HISTORY 2007-06-24 [PTadmin] Header formatted for Contributor Agreement
// 0 !HISTORY 2008-07-01 [PTadmin] Official Update 2008-01
// 
// 
// 4 16 9 0 0 10 0 0 9.239 0 3.827 8.3151 0 3.4443
  [4,16,9,0,0,10,0,0,9.239,0,3.827,8.3151,0,3.4443],
// 4 16 8.3151 0 3.4443 9.239 0 3.827 7.071 0 7.071 6.3639 0 6.3639
  [4,16,8.3151,0,3.4443,9.239,0,3.827,7.071,0,7.071,6.3639,0,6.3639],
// 4 16 6.3639 0 6.3639 7.071 0 7.071 3.827 0 9.239 3.4443 0 8.3151
  [4,16,6.3639,0,6.3639,7.071,0,7.071,3.827,0,9.239,3.4443,0,8.3151],
// 4 16 3.4443 0 8.3151 3.827 0 9.239 0 0 10 0 0 9
  [4,16,3.4443,0,8.3151,3.827,0,9.239,0,0,10,0,0,9],
// 4 16 0 0 9 0 0 10 -3.827 0 9.239 -3.4443 0 8.3151
  [4,16,0,0,9,0,0,10,-3.827,0,9.239,-3.4443,0,8.3151],
// 4 16 -3.4443 0 8.3151 -3.827 0 9.239 -7.071 0 7.071 -6.3639 0 6.3639
  [4,16,-3.4443,0,8.3151,-3.827,0,9.239,-7.071,0,7.071,-6.3639,0,6.3639],
// 4 16 -6.3639 0 6.3639 -7.071 0 7.071 -9.239 0 3.827 -8.3151 0 3.4443
  [4,16,-6.3639,0,6.3639,-7.071,0,7.071,-9.239,0,3.827,-8.3151,0,3.4443],
// 4 16 -8.3151 0 3.4443 -9.239 0 3.827 -10 0 0 -9 0 0
  [4,16,-8.3151,0,3.4443,-9.239,0,3.827,-10,0,0,-9,0,0],
// 4 16 -9 0 0 -10 0 0 -9.239 0 -3.827 -8.3151 0 -3.4443
  [4,16,-9,0,0,-10,0,0,-9.239,0,-3.827,-8.3151,0,-3.4443],
// 4 16 -8.3151 0 -3.4443 -9.239 0 -3.827 -7.071 0 -7.071 -6.3639 0 -6.3639
  [4,16,-8.3151,0,-3.4443,-9.239,0,-3.827,-7.071,0,-7.071,-6.3639,0,-6.3639],
// 4 16 -6.3639 0 -6.3639 -7.071 0 -7.071 -3.827 0 -9.239 -3.4443 0 -8.3151
  [4,16,-6.3639,0,-6.3639,-7.071,0,-7.071,-3.827,0,-9.239,-3.4443,0,-8.3151],
// 4 16 -3.4443 0 -8.3151 -3.827 0 -9.239 0 0 -10 0 0 -9
  [4,16,-3.4443,0,-8.3151,-3.827,0,-9.239,0,0,-10,0,0,-9],
// 4 16 0 0 -9 0 0 -10 3.827 0 -9.239 3.4443 0 -8.3151
  [4,16,0,0,-9,0,0,-10,3.827,0,-9.239,3.4443,0,-8.3151],
// 4 16 3.4443 0 -8.3151 3.827 0 -9.239 7.071 0 -7.071 6.3639 0 -6.3639
  [4,16,3.4443,0,-8.3151,3.827,0,-9.239,7.071,0,-7.071,6.3639,0,-6.3639],
// 4 16 6.3639 0 -6.3639 7.071 0 -7.071 9.239 0 -3.827 8.3151 0 -3.4443
  [4,16,6.3639,0,-6.3639,7.071,0,-7.071,9.239,0,-3.827,8.3151,0,-3.4443],
// 4 16 8.3151 0 -3.4443 9.239 0 -3.827 10 0 0 9 0 0
  [4,16,8.3151,0,-3.4443,9.239,0,-3.827,10,0,0,9,0,0],
// 0
];
makepoly(ldraw_lib__4_4ring9(), line=0.2);
// file: ../p/1-16chrd.scad
use <../lib.scad>
use <empty.scad>
$fa=1; $fs=0.2;
function ldraw_lib__1_16chrd(realsolid=false) = [
// 0 Chord 0.0625
// 0 Name: 1-16chrd.dat
// 0 Author: Philippe Hurbain [Philo]
// 0 !LDRAW_ORG Primitive UPDATE 2015-01
// 0 !LICENSE Licensed under CC BY 2.0 and CC BY 4.0 : see CAreadme.txt
// 
// 0 BFC CERTIFY CCW
  [0,"BFC","CERTIFY"],
  [0,"BFC","CCW"],
// 
// 0 !HISTORY 2015-10-11 [PTadmin] Official Update 2015-01
// 
// 
// 0 // This file is intentionally empty because at the current \P resolution,
// 0 // an 1-16chrd is actually empty. However, this file still is present
// 0 // to allow tools to do primitives substition and fill in a real chrd here,
// 0 // or, if desired, to substitute this with the hi-res 48\1-16chrd.
// 
// 0 // This file is based on an idea by Darats at http://forums.ldraw.org/read.php?19,14500,14500#msg-14500
// 
// 1 16 0 0 0 1 0 0 0 1 0 0 0 1 empty.dat
  [1,16,0,0,0,1,0,0,0,1,0,0,0,1, ldraw_lib__empty(realsolid)],
];
module ldraw_lib__1_16chrd(step=0, col=false, unit=2/5, alt=false, line=0.2, solid=!$preview)
    makepoly(ldraw_lib__1_16chrd(solid), step=step, col=col, unit=unit, alt=alt, line=line, solid=solid);
ldraw_lib__1_16chrd(line=0.2);
// file: s/98138s01.scad
use <../../lib.scad>
use <../../p/4-4ring9.scad>
use <98138s02.scad>
function ldraw_lib__s__98138s01() = [
// 0 ~Tile  1 x  1 Round with Groove with Partial Top Face
// 0 Name: s\98138s01.dat
// 0 Author: Magnus Forsberg [MagFors]
// 0 !LDRAW_ORG Subpart UPDATE 2020-01
// 0 !LICENSE Licensed under CC BY 2.0 and CC BY 4.0 : see CAreadme.txt
// 
// 0 BFC CERTIFY CCW
  [0,"BFC","CERTIFY"],
  [0,"BFC","CCW"],
// 
// 0 !HISTORY 2011-12-29 [PTadmin] Official Update 2011-02
// 0 !HISTORY 2016-06-17 [MagFors] Reduced the rounded edge to 0.5 ldu
// 0 !HISTORY 2016-12-31 [PTadmin] Official Update 2016-01
// 0 !HISTORY 2019-06-17 [MagFors] Removed the rounded edge
// 0 !HISTORY 2019-07-19 [MagFors] Subfiled without top surface
// 0 !HISTORY 2020-06-28 [PTadmin] Official Update 2020-01
// 
// 
// 1 16 0 0 0 1 0 0 0 1 0 0 0 1 s\98138s02.dat
  [1,16,0,0,0,1,0,0,0,1,0,0,0,1, ldraw_lib__s__98138s02()],
// 1 16 0 0 0 1 0 0 0 1 0 0 0 1 4-4ring9.dat
  [1,16,0,0,0,1,0,0,0,1,0,0,0,1, ldraw_lib__4_4ring9()],
];
module ldraw_lib__s__98138s01(step=0, col=false, unit=2/5, alt=false, line=0.2, solid=!$preview)
    makepoly(ldraw_lib__s__98138s01(), step=step, col=col, unit=unit, alt=alt, line=line, solid=solid);
ldraw_lib__s__98138s01(line=0.2);
// file: ../p/4-4ering.scad
use <../lib.scad>
use <1-16chrd.scad>
function ldraw_lib__4_4ering() = [
// 0 Adapter Ring Triangles to Normal 1.0
// 0 Name: 4-4ering.dat
// 0 Author: Philippe Hurbain [Philo]
// 0 !LDRAW_ORG Primitive UPDATE 2015-01
// 0 !LICENSE Licensed under CC BY 2.0 and CC BY 4.0 : see CAreadme.txt
// 
// 0 BFC CERTIFY CCW
  [0,"BFC","CERTIFY"],
  [0,"BFC","CCW"],
// 
// 0 !HISTORY 2015-10-11 [PTadmin] Official Update 2015-01
// 
// 
// 0 // This file uses 1-16chrd (actually empty). It allows
// 0 // tools to do primitives substition and fill in a ring of chrd here,
// 0 // or, if desired, to substitute this with the hi-res 48\1-16chrd.
// 0 // This file is based on an idea by Darats at http://forums.ldraw.org/read.php?19,14500,14500#msg-14500
// 
// 1 16 0 0 0 1 0 0 0 1 0 0 0 1 1-16chrd.dat
  [1,16,0,0,0,1,0,0,0,1,0,0,0,1, ldraw_lib__1_16chrd()],
// 1 16 0 0 0 0.92388 0 0.38268 0 1 0 -0.38268 0 0.92388 1-16chrd.dat
  [1,16,0,0,0,0.92388,0,0.38268,0,1,0,-0.38268,0,0.92388, ldraw_lib__1_16chrd()],
// 1 16 0 0 0 0.70711 0 0.70711 0 1 0 -0.70711 0 0.70711 1-16chrd.dat
  [1,16,0,0,0,0.70711,0,0.70711,0,1,0,-0.70711,0,0.70711, ldraw_lib__1_16chrd()],
// 1 16 0 0 0 0.38268 0 0.92388 0 1 0 -0.92388 0 0.38268 1-16chrd.dat
  [1,16,0,0,0,0.38268,0,0.92388,0,1,0,-0.92388,0,0.38268, ldraw_lib__1_16chrd()],
// 1 16 0 0 0 0 0 1 0 1 0 -1 0 0 1-16chrd.dat
  [1,16,0,0,0,0,0,1,0,1,0,-1,0,0, ldraw_lib__1_16chrd()],
// 1 16 0 0 0 -0.38268 0 0.92388 0 1 0 -0.92388 0 -0.38268 1-16chrd.dat
  [1,16,0,0,0,-0.38268,0,0.92388,0,1,0,-0.92388,0,-0.38268, ldraw_lib__1_16chrd()],
// 1 16 0 0 0 -0.70711 0 0.70711 0 1 0 -0.70711 0 -0.70711 1-16chrd.dat
  [1,16,0,0,0,-0.70711,0,0.70711,0,1,0,-0.70711,0,-0.70711, ldraw_lib__1_16chrd()],
// 1 16 0 0 0 -0.92388 0 0.38268 0 1 0 -0.38268 0 -0.92388 1-16chrd.dat
  [1,16,0,0,0,-0.92388,0,0.38268,0,1,0,-0.38268,0,-0.92388, ldraw_lib__1_16chrd()],
// 1 16 0 0 0 0 0 -1 0 1 0 1 0 0 1-16chrd.dat
  [1,16,0,0,0,0,0,-1,0,1,0,1,0,0, ldraw_lib__1_16chrd()],
// 1 16 0 0 0 0.38268 0 -0.92388 0 1 0 0.92388 0 0.38268 1-16chrd.dat
  [1,16,0,0,0,0.38268,0,-0.92388,0,1,0,0.92388,0,0.38268, ldraw_lib__1_16chrd()],
// 1 16 0 0 0 0.70711 0 -0.70711 0 1 0 0.70711 0 0.70711 1-16chrd.dat
  [1,16,0,0,0,0.70711,0,-0.70711,0,1,0,0.70711,0,0.70711, ldraw_lib__1_16chrd()],
// 1 16 0 0 0 0.92388 0 -0.38268 0 1 0 0.38268 0 0.92388 1-16chrd.dat
  [1,16,0,0,0,0.92388,0,-0.38268,0,1,0,0.38268,0,0.92388, ldraw_lib__1_16chrd()],
// 1 16 0 0 0 -1 0 0 0 1 0 0 0 -1 1-16chrd.dat
  [1,16,0,0,0,-1,0,0,0,1,0,0,0,-1, ldraw_lib__1_16chrd()],
// 1 16 0 0 0 -0.92388 0 -0.38268 0 1 0 0.38268 0 -0.92388 1-16chrd.dat
  [1,16,0,0,0,-0.92388,0,-0.38268,0,1,0,0.38268,0,-0.92388, ldraw_lib__1_16chrd()],
// 1 16 0 0 0 -0.70711 0 -0.70711 0 1 0 0.70711 0 -0.70711 1-16chrd.dat
  [1,16,0,0,0,-0.70711,0,-0.70711,0,1,0,0.70711,0,-0.70711, ldraw_lib__1_16chrd()],
// 1 16 0 0 0 -0.38268 0 -0.92388 0 1 0 0.92388 0 -0.38268 1-16chrd.dat
  [1,16,0,0,0,-0.38268,0,-0.92388,0,1,0,0.92388,0,-0.38268, ldraw_lib__1_16chrd()],
];
makepoly(ldraw_lib__4_4ering(), line=0.2);
// main file
use <../lib.scad>
use <../p/4-4ering.scad>
use <s/98138s01.scad>
function ldraw_lib__98138p12() = [
// 0 Tile  1 x  1 Round with Bone on Black Background Pattern
// 0 Name: 98138p12.dat
// 0 Author: Takeshi Takahashi [RainbowDolphin]
// 0 !LDRAW_ORG Part UPDATE 2022-01
// 0 !LICENSE Licensed under CC BY 4.0 : see CAreadme.txt
// 
// 0 BFC CERTIFY CCW
  [0,"BFC","CERTIFY"],
  [0,"BFC","CCW"],
// 
// 0 !KEYWORDS Bricklink 98138pb131, Dog, Dots, Puppy, Rebrickable 98138pr0145
// 0 !KEYWORDS Set 41908
// 
// 0 !HISTORY 2022-01-14 [PTadmin] Official Update 2022-01
// 
// 
// 1 16 0 0 0 1 0 0 0 1 0 0 0 1 s\98138s01.dat
  [1,16,0,0,0,1,0,0,0,1,0,0,0,1, ldraw_lib__s__98138s01()],
// 1 0 0 0 0 9 0 0 0 1 0 0 0 9 4-4ering.dat
  [1,0,0,0,0,9,0,0,0,1,0,0,0,9, ldraw_lib__4_4ering()],
// 4 16 2.2 0 1.8 -2.2 0 1.8 -2.2 0 -1.8 2.2 0 -1.8
  [4,16,2.2,0,1.8,-2.2,0,1.8,-2.2,0,-1.8,2.2,0,-1.8],
// 4 16 -5.6 0 0 -2.2 0 -1.8 -2.2 0 1.8 -5.96 0 0.24
  [4,16,-5.6,0,0,-2.2,0,-1.8,-2.2,0,1.8,-5.96,0,0.24],
// 4 16 2.2 0 1.8 2.2 0 -1.8 5.6 0 0 5.96 0 0.24
  [4,16,2.2,0,1.8,2.2,0,-1.8,5.6,0,0,5.96,0,0.24],
// 4 16 -5.96 0 0.24 -2.2 0 1.8 -2.37 0 2.64 -6.43 0 0.96
  [4,16,-5.96,0,0.24,-2.2,0,1.8,-2.37,0,2.64,-6.43,0,0.96],
// 4 16 -6.43 0 0.96 -2.37 0 2.64 -2.84 0 3.36 -6.6 0 1.8
  [4,16,-6.43,0,0.96,-2.37,0,2.64,-2.84,0,3.36,-6.6,0,1.8],
// 4 16 -6.6 0 1.8 -2.84 0 3.36 -3.56 0 3.83 -6.43 0 2.64
  [4,16,-6.6,0,1.8,-2.84,0,3.36,-3.56,0,3.83,-6.43,0,2.64],
// 4 16 -6.43 0 2.64 -3.56 0 3.83 -4.4 0 4 -5.96 0 3.36
  [4,16,-6.43,0,2.64,-3.56,0,3.83,-4.4,0,4,-5.96,0,3.36],
// 3 16 -4.4 0 4 -5.24 0 3.83 -5.96 0 3.36
  [3,16,-4.4,0,4,-5.24,0,3.83,-5.96,0,3.36],
// 4 16 -2.2 0 -1.8 -5.6 0 0 -5.96 0 -0.24 -2.37 0 -2.64
  [4,16,-2.2,0,-1.8,-5.6,0,0,-5.96,0,-0.24,-2.37,0,-2.64],
// 4 16 -2.37 0 -2.64 -5.96 0 -0.24 -6.43 0 -0.96 -2.84 0 -3.36
  [4,16,-2.37,0,-2.64,-5.96,0,-0.24,-6.43,0,-0.96,-2.84,0,-3.36],
// 4 16 -2.84 0 -3.36 -6.43 0 -0.96 -6.6 0 -1.8 -3.56 0 -3.83
  [4,16,-2.84,0,-3.36,-6.43,0,-0.96,-6.6,0,-1.8,-3.56,0,-3.83],
// 4 16 -3.56 0 -3.83 -6.6 0 -1.8 -6.43 0 -2.64 -4.4 0 -4
  [4,16,-3.56,0,-3.83,-6.6,0,-1.8,-6.43,0,-2.64,-4.4,0,-4],
// 4 16 -4.4 0 -4 -6.43 0 -2.64 -5.96 0 -3.36 -5.24 0 -3.83
  [4,16,-4.4,0,-4,-6.43,0,-2.64,-5.96,0,-3.36,-5.24,0,-3.83],
// 4 16 2.37 0 2.64 2.2 0 1.8 5.96 0 0.24 6.43 0 0.96
  [4,16,2.37,0,2.64,2.2,0,1.8,5.96,0,0.24,6.43,0,0.96],
// 4 16 2.84 0 3.36 2.37 0 2.64 6.43 0 0.96 6.6 0 1.8
  [4,16,2.84,0,3.36,2.37,0,2.64,6.43,0,0.96,6.6,0,1.8],
// 4 16 3.56 0 3.83 2.84 0 3.36 6.6 0 1.8 6.43 0 2.64
  [4,16,3.56,0,3.83,2.84,0,3.36,6.6,0,1.8,6.43,0,2.64],
// 4 16 4.4 0 4 3.56 0 3.83 6.43 0 2.64 5.96 0 3.36
  [4,16,4.4,0,4,3.56,0,3.83,6.43,0,2.64,5.96,0,3.36],
// 3 16 4.4 0 4 5.96 0 3.36 5.24 0 3.83
  [3,16,4.4,0,4,5.96,0,3.36,5.24,0,3.83],
// 4 16 5.96 0 -0.24 5.6 0 0 2.2 0 -1.8 2.37 0 -2.64
  [4,16,5.96,0,-0.24,5.6,0,0,2.2,0,-1.8,2.37,0,-2.64],
// 4 16 6.43 0 -0.96 5.96 0 -0.24 2.37 0 -2.64 2.84 0 -3.36
  [4,16,6.43,0,-0.96,5.96,0,-0.24,2.37,0,-2.64,2.84,0,-3.36],
// 4 16 6.6 0 -1.8 6.43 0 -0.96 2.84 0 -3.36 3.56 0 -3.83
  [4,16,6.6,0,-1.8,6.43,0,-0.96,2.84,0,-3.36,3.56,0,-3.83],
// 4 16 6.43 0 -2.64 6.6 0 -1.8 3.56 0 -3.83 4.4 0 -4
  [4,16,6.43,0,-2.64,6.6,0,-1.8,3.56,0,-3.83,4.4,0,-4],
// 4 16 5.96 0 -3.36 6.43 0 -2.64 4.4 0 -4 5.24 0 -3.83
  [4,16,5.96,0,-3.36,6.43,0,-2.64,4.4,0,-4,5.24,0,-3.83],
// 4 0 -2.2 0 1.8 2.2 0 1.8 0 0 9 -2.37 0 2.64
  [4,0,-2.2,0,1.8,2.2,0,1.8,0,0,9,-2.37,0,2.64],
// 4 0 -2.37 0 2.64 0 0 9 -3.4443 0 8.3151 -2.84 0 3.36
  [4,0,-2.37,0,2.64,0,0,9,-3.4443,0,8.3151,-2.84,0,3.36],
// 3 0 -3.4443 0 8.3151 -3.56 0 3.83 -2.84 0 3.36
  [3,0,-3.4443,0,8.3151,-3.56,0,3.83,-2.84,0,3.36],
// 4 0 -4.4 0 4 -3.56 0 3.83 -3.4443 0 8.3151 -6.3639 0 6.3639
  [4,0,-4.4,0,4,-3.56,0,3.83,-3.4443,0,8.3151,-6.3639,0,6.3639],
// 3 0 -6.3639 0 6.3639 -5.24 0 3.83 -4.4 0 4
  [3,0,-6.3639,0,6.3639,-5.24,0,3.83,-4.4,0,4],
// 4 0 -5.96 0 3.36 -5.24 0 3.83 -6.3639 0 6.3639 -8.3151 0 3.4443
  [4,0,-5.96,0,3.36,-5.24,0,3.83,-6.3639,0,6.3639,-8.3151,0,3.4443],
// 3 0 -8.3151 0 3.4443 -6.43 0 2.64 -5.96 0 3.36
  [3,0,-8.3151,0,3.4443,-6.43,0,2.64,-5.96,0,3.36],
// 4 0 -6.6 0 1.8 -6.43 0 2.64 -8.3151 0 3.4443 -9 0 0
  [4,0,-6.6,0,1.8,-6.43,0,2.64,-8.3151,0,3.4443,-9,0,0],
// 3 0 -6.6 0 1.8 -9 0 0 -6.43 0 0.96
  [3,0,-6.6,0,1.8,-9,0,0,-6.43,0,0.96],
// 3 0 -6.43 0 0.96 -9 0 0 -5.96 0 0.24
  [3,0,-6.43,0,0.96,-9,0,0,-5.96,0,0.24],
// 4 0 -5.6 0 0 -5.96 0 0.24 -9 0 0 -5.96 0 -0.24
  [4,0,-5.6,0,0,-5.96,0,0.24,-9,0,0,-5.96,0,-0.24],
// 3 0 -9 0 0 -6.43 0 -0.96 -5.96 0 -0.24
  [3,0,-9,0,0,-6.43,0,-0.96,-5.96,0,-0.24],
// 4 0 -6.6 0 -1.8 -6.43 0 -0.96 -9 0 0 -8.3151 0 -3.4443
  [4,0,-6.6,0,-1.8,-6.43,0,-0.96,-9,0,0,-8.3151,0,-3.4443],
// 3 0 -6.6 0 -1.8 -8.3151 0 -3.4443 -6.43 0 -2.64
  [3,0,-6.6,0,-1.8,-8.3151,0,-3.4443,-6.43,0,-2.64],
// 4 0 -5.96 0 -3.36 -6.43 0 -2.64 -8.3151 0 -3.4443 -6.3639 0 -6.3639
  [4,0,-5.96,0,-3.36,-6.43,0,-2.64,-8.3151,0,-3.4443,-6.3639,0,-6.3639],
// 3 0 -5.96 0 -3.36 -6.3639 0 -6.3639 -5.24 0 -3.83
  [3,0,-5.96,0,-3.36,-6.3639,0,-6.3639,-5.24,0,-3.83],
// 4 0 -4.4 0 -4 -5.24 0 -3.83 -6.3639 0 -6.3639 -3.4443 0 -8.3151
  [4,0,-4.4,0,-4,-5.24,0,-3.83,-6.3639,0,-6.3639,-3.4443,0,-8.3151],
// 3 0 -3.56 0 -3.83 -4.4 0 -4 -3.4443 0 -8.3151
  [3,0,-3.56,0,-3.83,-4.4,0,-4,-3.4443,0,-8.3151],
// 3 0 -2.84 0 -3.36 -3.56 0 -3.83 -3.4443 0 -8.3151
  [3,0,-2.84,0,-3.36,-3.56,0,-3.83,-3.4443,0,-8.3151],
// 4 0 -2.37 0 -2.64 -2.84 0 -3.36 -3.4443 0 -8.3151 0 0 -9
  [4,0,-2.37,0,-2.64,-2.84,0,-3.36,-3.4443,0,-8.3151,0,0,-9],
// 4 0 -2.2 0 -1.8 -2.37 0 -2.64 0 0 -9 2.2 0 -1.8
  [4,0,-2.2,0,-1.8,-2.37,0,-2.64,0,0,-9,2.2,0,-1.8],
// 4 0 2.37 0 -2.64 2.2 0 -1.8 0 0 -9 3.4443 0 -8.3151
  [4,0,2.37,0,-2.64,2.2,0,-1.8,0,0,-9,3.4443,0,-8.3151],
// 3 0 2.37 0 -2.64 3.4443 0 -8.3151 2.84 0 -3.36
  [3,0,2.37,0,-2.64,3.4443,0,-8.3151,2.84,0,-3.36],
// 3 0 2.84 0 -3.36 3.4443 0 -8.3151 3.56 0 -3.83
  [3,0,2.84,0,-3.36,3.4443,0,-8.3151,3.56,0,-3.83],
// 4 0 4.4 0 -4 3.56 0 -3.83 3.4443 0 -8.3151 6.3639 0 -6.3639
  [4,0,4.4,0,-4,3.56,0,-3.83,3.4443,0,-8.3151,6.3639,0,-6.3639],
// 3 0 5.24 0 -3.83 4.4 0 -4 6.3639 0 -6.3639
  [3,0,5.24,0,-3.83,4.4,0,-4,6.3639,0,-6.3639],
// 4 0 5.96 0 -3.36 5.24 0 -3.83 6.3639 0 -6.3639 8.3151 0 -3.4443
  [4,0,5.96,0,-3.36,5.24,0,-3.83,6.3639,0,-6.3639,8.3151,0,-3.4443],
// 3 0 6.43 0 -2.64 5.96 0 -3.36 8.3151 0 -3.4443
  [3,0,6.43,0,-2.64,5.96,0,-3.36,8.3151,0,-3.4443],
// 4 0 6.6 0 -1.8 6.43 0 -2.64 8.3151 0 -3.4443 9 0 0
  [4,0,6.6,0,-1.8,6.43,0,-2.64,8.3151,0,-3.4443,9,0,0],
// 3 0 9 0 0 6.43 0 -0.96 6.6 0 -1.8
  [3,0,9,0,0,6.43,0,-0.96,6.6,0,-1.8],
// 3 0 9 0 0 5.96 0 -0.24 6.43 0 -0.96
  [3,0,9,0,0,5.96,0,-0.24,6.43,0,-0.96],
// 4 0 5.6 0 0 5.96 0 -0.24 9 0 0 5.96 0 0.24
  [4,0,5.6,0,0,5.96,0,-0.24,9,0,0,5.96,0,0.24],
// 3 0 6.43 0 0.96 5.96 0 0.24 9 0 0
  [3,0,6.43,0,0.96,5.96,0,0.24,9,0,0],
// 4 0 6.6 0 1.8 6.43 0 0.96 9 0 0 8.3151 0 3.4443
  [4,0,6.6,0,1.8,6.43,0,0.96,9,0,0,8.3151,0,3.4443],
// 3 0 8.3151 0 3.4443 6.43 0 2.64 6.6 0 1.8
  [3,0,8.3151,0,3.4443,6.43,0,2.64,6.6,0,1.8],
// 4 0 5.96 0 3.36 6.43 0 2.64 8.3151 0 3.4443 6.3639 0 6.3639
  [4,0,5.96,0,3.36,6.43,0,2.64,8.3151,0,3.4443,6.3639,0,6.3639],
// 3 0 6.3639 0 6.3639 5.24 0 3.83 5.96 0 3.36
  [3,0,6.3639,0,6.3639,5.24,0,3.83,5.96,0,3.36],
// 4 0 4.4 0 4 5.24 0 3.83 6.3639 0 6.3639 3.4443 0 8.3151
  [4,0,4.4,0,4,5.24,0,3.83,6.3639,0,6.3639,3.4443,0,8.3151],
// 3 0 3.4443 0 8.3151 3.56 0 3.83 4.4 0 4
  [3,0,3.4443,0,8.3151,3.56,0,3.83,4.4,0,4],
// 3 0 3.4443 0 8.3151 2.84 0 3.36 3.56 0 3.83
  [3,0,3.4443,0,8.3151,2.84,0,3.36,3.56,0,3.83],
// 4 0 2.37 0 2.64 2.84 0 3.36 3.4443 0 8.3151 0 0 9
  [4,0,2.37,0,2.64,2.84,0,3.36,3.4443,0,8.3151,0,0,9],
// 3 0 0 0 9 2.2 0 1.8 2.37 0 2.64
  [3,0,0,0,9,2.2,0,1.8,2.37,0,2.64],
];
module ldraw_lib__98138p12(step=0, col=false, unit=2/5, alt=false, line=0.2, solid=!$preview)
    makepoly(ldraw_lib__98138p12(), step=step, col=col, unit=unit, alt=alt, line=line, solid=solid);
ldraw_lib__98138p12(line=0.2);
